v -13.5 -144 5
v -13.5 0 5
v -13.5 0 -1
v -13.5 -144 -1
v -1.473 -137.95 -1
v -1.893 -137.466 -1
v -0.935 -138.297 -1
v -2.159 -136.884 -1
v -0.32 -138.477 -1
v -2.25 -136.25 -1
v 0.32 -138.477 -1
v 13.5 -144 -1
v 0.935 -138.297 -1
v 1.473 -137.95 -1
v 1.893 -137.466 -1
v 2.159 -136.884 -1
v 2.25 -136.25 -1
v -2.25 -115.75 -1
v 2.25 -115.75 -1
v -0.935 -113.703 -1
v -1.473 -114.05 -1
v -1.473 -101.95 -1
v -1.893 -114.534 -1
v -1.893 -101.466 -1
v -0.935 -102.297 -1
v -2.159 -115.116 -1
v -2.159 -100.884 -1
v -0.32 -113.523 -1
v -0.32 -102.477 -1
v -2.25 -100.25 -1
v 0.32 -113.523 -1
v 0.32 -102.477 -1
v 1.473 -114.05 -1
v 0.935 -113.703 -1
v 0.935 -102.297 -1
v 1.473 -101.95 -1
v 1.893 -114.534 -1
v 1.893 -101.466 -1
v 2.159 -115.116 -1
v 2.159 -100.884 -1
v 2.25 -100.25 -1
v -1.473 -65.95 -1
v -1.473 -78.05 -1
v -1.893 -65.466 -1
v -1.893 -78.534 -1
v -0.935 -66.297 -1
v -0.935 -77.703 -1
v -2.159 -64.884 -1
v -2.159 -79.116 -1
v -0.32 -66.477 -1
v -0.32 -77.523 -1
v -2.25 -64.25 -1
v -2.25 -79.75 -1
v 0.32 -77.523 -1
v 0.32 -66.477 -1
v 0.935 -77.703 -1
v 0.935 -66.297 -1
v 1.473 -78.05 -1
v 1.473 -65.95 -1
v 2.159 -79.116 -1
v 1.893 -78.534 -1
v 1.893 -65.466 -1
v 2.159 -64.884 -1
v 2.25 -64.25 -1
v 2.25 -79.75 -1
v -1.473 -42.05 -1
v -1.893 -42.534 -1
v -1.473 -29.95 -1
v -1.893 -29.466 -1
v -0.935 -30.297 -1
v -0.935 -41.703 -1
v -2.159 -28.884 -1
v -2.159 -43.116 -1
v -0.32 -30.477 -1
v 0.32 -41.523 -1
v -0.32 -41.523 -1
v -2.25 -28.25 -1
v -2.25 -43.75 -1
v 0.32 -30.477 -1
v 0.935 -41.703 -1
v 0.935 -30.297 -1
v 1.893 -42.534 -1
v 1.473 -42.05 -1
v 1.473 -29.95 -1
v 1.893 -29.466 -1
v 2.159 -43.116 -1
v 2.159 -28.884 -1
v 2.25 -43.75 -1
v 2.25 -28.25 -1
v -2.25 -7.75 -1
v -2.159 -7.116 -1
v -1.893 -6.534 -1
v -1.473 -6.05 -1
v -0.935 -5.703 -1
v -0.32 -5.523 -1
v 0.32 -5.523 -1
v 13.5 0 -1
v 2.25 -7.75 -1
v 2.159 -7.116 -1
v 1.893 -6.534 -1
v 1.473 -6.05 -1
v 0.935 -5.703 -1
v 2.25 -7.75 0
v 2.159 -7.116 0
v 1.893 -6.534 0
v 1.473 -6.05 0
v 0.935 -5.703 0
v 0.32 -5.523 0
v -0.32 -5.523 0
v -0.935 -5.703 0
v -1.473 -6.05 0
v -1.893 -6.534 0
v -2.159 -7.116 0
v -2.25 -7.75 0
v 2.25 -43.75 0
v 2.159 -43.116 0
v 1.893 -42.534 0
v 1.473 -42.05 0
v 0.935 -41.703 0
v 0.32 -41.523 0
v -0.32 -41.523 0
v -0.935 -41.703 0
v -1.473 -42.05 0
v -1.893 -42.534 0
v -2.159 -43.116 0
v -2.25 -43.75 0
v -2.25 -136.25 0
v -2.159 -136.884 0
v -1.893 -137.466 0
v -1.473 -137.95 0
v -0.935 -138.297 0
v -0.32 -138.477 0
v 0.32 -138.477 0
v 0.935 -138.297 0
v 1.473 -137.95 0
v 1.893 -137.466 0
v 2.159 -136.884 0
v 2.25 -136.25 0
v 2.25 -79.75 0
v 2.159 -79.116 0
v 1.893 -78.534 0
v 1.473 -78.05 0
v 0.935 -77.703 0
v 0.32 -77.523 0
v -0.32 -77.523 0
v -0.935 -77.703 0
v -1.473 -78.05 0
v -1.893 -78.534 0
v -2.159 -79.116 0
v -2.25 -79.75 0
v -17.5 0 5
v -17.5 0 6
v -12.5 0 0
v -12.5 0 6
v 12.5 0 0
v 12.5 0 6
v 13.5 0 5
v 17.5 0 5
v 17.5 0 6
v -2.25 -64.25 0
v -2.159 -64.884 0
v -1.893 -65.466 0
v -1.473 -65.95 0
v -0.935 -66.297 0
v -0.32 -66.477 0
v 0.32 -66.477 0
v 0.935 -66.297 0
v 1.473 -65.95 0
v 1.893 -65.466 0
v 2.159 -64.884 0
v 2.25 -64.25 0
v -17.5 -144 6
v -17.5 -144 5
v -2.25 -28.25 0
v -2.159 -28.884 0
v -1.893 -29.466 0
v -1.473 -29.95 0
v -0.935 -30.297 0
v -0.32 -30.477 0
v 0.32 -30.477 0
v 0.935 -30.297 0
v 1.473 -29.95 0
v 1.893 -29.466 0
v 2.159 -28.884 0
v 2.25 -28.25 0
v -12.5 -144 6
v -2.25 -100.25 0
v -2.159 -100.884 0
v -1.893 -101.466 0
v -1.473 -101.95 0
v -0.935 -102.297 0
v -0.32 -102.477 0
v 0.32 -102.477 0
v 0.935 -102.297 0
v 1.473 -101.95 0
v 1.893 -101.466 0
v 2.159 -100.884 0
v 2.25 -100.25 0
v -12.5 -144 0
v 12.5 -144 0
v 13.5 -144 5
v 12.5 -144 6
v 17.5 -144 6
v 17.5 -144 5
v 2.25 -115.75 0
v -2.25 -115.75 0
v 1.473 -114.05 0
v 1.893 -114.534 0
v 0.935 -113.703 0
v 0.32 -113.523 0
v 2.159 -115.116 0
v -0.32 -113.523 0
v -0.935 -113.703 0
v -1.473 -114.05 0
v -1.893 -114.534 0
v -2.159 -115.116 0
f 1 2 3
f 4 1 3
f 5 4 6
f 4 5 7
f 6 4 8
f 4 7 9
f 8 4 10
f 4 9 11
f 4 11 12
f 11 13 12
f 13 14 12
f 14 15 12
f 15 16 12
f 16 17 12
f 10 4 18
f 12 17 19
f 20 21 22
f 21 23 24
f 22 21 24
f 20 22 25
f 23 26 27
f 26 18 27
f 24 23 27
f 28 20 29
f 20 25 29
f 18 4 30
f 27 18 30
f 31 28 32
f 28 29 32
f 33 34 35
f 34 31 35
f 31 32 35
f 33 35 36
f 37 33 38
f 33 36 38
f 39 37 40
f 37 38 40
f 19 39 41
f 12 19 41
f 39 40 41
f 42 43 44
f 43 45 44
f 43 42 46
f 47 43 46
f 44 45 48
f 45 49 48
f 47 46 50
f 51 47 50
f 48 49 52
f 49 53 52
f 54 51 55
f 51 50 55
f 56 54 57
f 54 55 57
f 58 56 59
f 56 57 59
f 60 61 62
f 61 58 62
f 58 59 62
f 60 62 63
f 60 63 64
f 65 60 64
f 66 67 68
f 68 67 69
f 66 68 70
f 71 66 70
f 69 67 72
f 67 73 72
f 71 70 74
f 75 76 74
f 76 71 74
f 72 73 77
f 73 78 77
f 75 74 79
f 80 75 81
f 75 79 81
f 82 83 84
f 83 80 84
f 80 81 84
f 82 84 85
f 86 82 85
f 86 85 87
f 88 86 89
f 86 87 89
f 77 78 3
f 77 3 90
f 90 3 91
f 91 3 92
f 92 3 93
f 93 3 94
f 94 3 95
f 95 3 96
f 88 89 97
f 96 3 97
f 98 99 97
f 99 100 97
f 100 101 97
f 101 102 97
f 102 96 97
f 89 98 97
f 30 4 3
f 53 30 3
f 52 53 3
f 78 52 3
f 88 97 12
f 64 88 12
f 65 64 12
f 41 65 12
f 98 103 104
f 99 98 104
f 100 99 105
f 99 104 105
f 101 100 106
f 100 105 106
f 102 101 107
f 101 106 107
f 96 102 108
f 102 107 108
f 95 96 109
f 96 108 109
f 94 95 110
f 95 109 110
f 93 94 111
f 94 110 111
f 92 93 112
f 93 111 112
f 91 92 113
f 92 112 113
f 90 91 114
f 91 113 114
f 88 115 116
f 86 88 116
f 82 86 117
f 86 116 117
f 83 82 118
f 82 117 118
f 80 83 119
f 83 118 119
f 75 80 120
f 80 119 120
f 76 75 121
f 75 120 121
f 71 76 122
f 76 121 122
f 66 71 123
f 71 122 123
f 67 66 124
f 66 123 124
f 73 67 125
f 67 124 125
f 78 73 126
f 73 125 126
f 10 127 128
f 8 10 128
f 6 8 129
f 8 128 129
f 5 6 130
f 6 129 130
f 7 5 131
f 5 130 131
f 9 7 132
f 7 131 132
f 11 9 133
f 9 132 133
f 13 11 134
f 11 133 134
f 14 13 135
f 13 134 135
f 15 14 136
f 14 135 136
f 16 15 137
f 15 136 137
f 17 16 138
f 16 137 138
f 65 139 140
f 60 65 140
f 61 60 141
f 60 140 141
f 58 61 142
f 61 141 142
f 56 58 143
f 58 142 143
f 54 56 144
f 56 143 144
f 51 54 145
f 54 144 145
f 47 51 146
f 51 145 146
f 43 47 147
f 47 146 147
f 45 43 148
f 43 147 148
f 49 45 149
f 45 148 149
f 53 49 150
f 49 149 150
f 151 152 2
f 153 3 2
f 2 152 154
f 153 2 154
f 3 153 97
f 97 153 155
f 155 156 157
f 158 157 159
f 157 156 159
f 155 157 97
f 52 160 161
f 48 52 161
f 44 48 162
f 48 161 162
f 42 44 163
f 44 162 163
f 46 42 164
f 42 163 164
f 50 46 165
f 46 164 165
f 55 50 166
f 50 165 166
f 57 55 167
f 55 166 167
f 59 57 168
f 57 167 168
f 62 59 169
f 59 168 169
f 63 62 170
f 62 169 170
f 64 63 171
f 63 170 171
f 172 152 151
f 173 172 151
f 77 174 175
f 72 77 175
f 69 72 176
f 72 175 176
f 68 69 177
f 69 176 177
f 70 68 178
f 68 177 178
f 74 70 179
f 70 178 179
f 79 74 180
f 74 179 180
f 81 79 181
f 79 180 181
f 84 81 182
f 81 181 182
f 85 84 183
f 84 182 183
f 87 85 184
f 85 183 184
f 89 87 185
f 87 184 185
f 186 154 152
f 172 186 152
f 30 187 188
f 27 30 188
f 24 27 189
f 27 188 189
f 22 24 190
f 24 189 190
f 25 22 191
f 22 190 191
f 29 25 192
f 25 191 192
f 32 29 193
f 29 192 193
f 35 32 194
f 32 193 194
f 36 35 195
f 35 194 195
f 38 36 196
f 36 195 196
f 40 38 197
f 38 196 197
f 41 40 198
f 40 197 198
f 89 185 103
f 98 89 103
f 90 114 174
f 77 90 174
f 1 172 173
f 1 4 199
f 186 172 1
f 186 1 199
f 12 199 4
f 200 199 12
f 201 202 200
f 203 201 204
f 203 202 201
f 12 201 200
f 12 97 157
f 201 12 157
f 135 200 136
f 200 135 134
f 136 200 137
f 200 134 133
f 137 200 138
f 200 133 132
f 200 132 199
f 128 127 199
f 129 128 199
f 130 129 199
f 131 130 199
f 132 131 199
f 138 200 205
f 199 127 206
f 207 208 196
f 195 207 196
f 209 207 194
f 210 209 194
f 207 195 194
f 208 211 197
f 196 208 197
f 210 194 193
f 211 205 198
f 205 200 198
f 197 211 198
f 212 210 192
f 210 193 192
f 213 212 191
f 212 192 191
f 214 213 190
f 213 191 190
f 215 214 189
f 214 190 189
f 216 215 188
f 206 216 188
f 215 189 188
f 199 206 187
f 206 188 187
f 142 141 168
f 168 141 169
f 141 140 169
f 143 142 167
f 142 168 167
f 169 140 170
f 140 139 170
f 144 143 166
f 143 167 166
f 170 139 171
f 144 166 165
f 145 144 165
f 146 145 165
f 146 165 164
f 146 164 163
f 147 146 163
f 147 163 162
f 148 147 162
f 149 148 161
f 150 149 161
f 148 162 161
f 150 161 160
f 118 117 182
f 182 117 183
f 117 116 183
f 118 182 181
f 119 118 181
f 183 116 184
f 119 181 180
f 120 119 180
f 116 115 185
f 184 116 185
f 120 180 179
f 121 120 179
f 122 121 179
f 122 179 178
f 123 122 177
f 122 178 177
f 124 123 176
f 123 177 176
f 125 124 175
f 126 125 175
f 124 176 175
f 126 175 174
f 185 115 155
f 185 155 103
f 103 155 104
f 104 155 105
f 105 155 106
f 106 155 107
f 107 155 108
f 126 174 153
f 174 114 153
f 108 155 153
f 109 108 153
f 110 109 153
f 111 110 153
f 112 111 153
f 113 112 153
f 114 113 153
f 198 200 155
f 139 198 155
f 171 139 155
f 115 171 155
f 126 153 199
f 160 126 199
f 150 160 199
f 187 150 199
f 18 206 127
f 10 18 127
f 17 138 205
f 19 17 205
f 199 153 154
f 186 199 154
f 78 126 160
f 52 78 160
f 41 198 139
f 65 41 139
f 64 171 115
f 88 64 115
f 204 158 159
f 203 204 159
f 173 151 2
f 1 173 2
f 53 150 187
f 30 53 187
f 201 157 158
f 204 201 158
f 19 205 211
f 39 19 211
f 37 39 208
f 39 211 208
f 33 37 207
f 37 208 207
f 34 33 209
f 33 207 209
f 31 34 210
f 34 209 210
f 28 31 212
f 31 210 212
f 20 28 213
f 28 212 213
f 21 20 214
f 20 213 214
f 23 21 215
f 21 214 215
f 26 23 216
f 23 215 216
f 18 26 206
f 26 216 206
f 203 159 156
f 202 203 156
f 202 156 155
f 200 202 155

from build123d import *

# Parameters (mm, degrees)
F1_DEPTH = 144
F3_DEPTH = 1.001


# Not quite as in the source:
# - a feature names something its author has since deleted; it is built from what else it names


with BuildPart() as f1:
    # F0 (on Front) → F1 (new body)
    with BuildSketch(Plane.XZ):
        Polygon((-17.5, 6), (-17.5, 5), (-13.5, 5), (-13.5, -1), (13.5, -1), (13.5, 5), (17.5, 5), (17.5, 6), (12.5, 6), (12.5, 0), (-12.5, 0), (-12.5, 6), align=None)
    extrude(amount=F1_DEPTH)

    # F2 (on face) → F3 (cut, through all)
    with BuildSketch(Plane.XY):
        with BuildLine():
            ThreePointArc((-2.25, -28.25), (0, -30.5), (2.25, -28.25))
            Line((2.25, -28.25), (2.25, -7.75))
            ThreePointArc((2.25, -7.75), (0, -5.5), (-2.25, -7.75))
            Line((-2.25, -7.75), (-2.25, -28.25))
        make_face()
        with BuildLine():
            Line((-2.25, -43.75), (-2.25, -64.25))
            ThreePointArc((-2.25, -64.25), (0, -66.5), (2.25, -64.25))
            Line((2.25, -64.25), (2.25, -43.75))
            ThreePointArc((2.25, -43.75), (0, -41.5), (-2.25, -43.75))
        make_face()
        with BuildLine():
            Line((-2.25, -79.75), (-2.25, -100.25))
            ThreePointArc((-2.25, -100.25), (0, -102.5), (2.25, -100.25))
            Line((2.25, -100.25), (2.25, -79.75))
            ThreePointArc((2.25, -79.75), (0, -77.5), (-2.25, -79.75))
        make_face()
        with BuildLine():
            Line((-2.25, -115.75), (-2.25, -136.25))
            ThreePointArc((-2.25, -136.25), (0, -138.5), (2.25, -136.25))
            Line((2.25, -136.25), (2.25, -115.75))
            ThreePointArc((2.25, -115.75), (0, -113.5), (-2.25, -115.75))
        make_face()
    extrude(amount=-F3_DEPTH, mode=Mode.SUBTRACT)


solid = f1.part
